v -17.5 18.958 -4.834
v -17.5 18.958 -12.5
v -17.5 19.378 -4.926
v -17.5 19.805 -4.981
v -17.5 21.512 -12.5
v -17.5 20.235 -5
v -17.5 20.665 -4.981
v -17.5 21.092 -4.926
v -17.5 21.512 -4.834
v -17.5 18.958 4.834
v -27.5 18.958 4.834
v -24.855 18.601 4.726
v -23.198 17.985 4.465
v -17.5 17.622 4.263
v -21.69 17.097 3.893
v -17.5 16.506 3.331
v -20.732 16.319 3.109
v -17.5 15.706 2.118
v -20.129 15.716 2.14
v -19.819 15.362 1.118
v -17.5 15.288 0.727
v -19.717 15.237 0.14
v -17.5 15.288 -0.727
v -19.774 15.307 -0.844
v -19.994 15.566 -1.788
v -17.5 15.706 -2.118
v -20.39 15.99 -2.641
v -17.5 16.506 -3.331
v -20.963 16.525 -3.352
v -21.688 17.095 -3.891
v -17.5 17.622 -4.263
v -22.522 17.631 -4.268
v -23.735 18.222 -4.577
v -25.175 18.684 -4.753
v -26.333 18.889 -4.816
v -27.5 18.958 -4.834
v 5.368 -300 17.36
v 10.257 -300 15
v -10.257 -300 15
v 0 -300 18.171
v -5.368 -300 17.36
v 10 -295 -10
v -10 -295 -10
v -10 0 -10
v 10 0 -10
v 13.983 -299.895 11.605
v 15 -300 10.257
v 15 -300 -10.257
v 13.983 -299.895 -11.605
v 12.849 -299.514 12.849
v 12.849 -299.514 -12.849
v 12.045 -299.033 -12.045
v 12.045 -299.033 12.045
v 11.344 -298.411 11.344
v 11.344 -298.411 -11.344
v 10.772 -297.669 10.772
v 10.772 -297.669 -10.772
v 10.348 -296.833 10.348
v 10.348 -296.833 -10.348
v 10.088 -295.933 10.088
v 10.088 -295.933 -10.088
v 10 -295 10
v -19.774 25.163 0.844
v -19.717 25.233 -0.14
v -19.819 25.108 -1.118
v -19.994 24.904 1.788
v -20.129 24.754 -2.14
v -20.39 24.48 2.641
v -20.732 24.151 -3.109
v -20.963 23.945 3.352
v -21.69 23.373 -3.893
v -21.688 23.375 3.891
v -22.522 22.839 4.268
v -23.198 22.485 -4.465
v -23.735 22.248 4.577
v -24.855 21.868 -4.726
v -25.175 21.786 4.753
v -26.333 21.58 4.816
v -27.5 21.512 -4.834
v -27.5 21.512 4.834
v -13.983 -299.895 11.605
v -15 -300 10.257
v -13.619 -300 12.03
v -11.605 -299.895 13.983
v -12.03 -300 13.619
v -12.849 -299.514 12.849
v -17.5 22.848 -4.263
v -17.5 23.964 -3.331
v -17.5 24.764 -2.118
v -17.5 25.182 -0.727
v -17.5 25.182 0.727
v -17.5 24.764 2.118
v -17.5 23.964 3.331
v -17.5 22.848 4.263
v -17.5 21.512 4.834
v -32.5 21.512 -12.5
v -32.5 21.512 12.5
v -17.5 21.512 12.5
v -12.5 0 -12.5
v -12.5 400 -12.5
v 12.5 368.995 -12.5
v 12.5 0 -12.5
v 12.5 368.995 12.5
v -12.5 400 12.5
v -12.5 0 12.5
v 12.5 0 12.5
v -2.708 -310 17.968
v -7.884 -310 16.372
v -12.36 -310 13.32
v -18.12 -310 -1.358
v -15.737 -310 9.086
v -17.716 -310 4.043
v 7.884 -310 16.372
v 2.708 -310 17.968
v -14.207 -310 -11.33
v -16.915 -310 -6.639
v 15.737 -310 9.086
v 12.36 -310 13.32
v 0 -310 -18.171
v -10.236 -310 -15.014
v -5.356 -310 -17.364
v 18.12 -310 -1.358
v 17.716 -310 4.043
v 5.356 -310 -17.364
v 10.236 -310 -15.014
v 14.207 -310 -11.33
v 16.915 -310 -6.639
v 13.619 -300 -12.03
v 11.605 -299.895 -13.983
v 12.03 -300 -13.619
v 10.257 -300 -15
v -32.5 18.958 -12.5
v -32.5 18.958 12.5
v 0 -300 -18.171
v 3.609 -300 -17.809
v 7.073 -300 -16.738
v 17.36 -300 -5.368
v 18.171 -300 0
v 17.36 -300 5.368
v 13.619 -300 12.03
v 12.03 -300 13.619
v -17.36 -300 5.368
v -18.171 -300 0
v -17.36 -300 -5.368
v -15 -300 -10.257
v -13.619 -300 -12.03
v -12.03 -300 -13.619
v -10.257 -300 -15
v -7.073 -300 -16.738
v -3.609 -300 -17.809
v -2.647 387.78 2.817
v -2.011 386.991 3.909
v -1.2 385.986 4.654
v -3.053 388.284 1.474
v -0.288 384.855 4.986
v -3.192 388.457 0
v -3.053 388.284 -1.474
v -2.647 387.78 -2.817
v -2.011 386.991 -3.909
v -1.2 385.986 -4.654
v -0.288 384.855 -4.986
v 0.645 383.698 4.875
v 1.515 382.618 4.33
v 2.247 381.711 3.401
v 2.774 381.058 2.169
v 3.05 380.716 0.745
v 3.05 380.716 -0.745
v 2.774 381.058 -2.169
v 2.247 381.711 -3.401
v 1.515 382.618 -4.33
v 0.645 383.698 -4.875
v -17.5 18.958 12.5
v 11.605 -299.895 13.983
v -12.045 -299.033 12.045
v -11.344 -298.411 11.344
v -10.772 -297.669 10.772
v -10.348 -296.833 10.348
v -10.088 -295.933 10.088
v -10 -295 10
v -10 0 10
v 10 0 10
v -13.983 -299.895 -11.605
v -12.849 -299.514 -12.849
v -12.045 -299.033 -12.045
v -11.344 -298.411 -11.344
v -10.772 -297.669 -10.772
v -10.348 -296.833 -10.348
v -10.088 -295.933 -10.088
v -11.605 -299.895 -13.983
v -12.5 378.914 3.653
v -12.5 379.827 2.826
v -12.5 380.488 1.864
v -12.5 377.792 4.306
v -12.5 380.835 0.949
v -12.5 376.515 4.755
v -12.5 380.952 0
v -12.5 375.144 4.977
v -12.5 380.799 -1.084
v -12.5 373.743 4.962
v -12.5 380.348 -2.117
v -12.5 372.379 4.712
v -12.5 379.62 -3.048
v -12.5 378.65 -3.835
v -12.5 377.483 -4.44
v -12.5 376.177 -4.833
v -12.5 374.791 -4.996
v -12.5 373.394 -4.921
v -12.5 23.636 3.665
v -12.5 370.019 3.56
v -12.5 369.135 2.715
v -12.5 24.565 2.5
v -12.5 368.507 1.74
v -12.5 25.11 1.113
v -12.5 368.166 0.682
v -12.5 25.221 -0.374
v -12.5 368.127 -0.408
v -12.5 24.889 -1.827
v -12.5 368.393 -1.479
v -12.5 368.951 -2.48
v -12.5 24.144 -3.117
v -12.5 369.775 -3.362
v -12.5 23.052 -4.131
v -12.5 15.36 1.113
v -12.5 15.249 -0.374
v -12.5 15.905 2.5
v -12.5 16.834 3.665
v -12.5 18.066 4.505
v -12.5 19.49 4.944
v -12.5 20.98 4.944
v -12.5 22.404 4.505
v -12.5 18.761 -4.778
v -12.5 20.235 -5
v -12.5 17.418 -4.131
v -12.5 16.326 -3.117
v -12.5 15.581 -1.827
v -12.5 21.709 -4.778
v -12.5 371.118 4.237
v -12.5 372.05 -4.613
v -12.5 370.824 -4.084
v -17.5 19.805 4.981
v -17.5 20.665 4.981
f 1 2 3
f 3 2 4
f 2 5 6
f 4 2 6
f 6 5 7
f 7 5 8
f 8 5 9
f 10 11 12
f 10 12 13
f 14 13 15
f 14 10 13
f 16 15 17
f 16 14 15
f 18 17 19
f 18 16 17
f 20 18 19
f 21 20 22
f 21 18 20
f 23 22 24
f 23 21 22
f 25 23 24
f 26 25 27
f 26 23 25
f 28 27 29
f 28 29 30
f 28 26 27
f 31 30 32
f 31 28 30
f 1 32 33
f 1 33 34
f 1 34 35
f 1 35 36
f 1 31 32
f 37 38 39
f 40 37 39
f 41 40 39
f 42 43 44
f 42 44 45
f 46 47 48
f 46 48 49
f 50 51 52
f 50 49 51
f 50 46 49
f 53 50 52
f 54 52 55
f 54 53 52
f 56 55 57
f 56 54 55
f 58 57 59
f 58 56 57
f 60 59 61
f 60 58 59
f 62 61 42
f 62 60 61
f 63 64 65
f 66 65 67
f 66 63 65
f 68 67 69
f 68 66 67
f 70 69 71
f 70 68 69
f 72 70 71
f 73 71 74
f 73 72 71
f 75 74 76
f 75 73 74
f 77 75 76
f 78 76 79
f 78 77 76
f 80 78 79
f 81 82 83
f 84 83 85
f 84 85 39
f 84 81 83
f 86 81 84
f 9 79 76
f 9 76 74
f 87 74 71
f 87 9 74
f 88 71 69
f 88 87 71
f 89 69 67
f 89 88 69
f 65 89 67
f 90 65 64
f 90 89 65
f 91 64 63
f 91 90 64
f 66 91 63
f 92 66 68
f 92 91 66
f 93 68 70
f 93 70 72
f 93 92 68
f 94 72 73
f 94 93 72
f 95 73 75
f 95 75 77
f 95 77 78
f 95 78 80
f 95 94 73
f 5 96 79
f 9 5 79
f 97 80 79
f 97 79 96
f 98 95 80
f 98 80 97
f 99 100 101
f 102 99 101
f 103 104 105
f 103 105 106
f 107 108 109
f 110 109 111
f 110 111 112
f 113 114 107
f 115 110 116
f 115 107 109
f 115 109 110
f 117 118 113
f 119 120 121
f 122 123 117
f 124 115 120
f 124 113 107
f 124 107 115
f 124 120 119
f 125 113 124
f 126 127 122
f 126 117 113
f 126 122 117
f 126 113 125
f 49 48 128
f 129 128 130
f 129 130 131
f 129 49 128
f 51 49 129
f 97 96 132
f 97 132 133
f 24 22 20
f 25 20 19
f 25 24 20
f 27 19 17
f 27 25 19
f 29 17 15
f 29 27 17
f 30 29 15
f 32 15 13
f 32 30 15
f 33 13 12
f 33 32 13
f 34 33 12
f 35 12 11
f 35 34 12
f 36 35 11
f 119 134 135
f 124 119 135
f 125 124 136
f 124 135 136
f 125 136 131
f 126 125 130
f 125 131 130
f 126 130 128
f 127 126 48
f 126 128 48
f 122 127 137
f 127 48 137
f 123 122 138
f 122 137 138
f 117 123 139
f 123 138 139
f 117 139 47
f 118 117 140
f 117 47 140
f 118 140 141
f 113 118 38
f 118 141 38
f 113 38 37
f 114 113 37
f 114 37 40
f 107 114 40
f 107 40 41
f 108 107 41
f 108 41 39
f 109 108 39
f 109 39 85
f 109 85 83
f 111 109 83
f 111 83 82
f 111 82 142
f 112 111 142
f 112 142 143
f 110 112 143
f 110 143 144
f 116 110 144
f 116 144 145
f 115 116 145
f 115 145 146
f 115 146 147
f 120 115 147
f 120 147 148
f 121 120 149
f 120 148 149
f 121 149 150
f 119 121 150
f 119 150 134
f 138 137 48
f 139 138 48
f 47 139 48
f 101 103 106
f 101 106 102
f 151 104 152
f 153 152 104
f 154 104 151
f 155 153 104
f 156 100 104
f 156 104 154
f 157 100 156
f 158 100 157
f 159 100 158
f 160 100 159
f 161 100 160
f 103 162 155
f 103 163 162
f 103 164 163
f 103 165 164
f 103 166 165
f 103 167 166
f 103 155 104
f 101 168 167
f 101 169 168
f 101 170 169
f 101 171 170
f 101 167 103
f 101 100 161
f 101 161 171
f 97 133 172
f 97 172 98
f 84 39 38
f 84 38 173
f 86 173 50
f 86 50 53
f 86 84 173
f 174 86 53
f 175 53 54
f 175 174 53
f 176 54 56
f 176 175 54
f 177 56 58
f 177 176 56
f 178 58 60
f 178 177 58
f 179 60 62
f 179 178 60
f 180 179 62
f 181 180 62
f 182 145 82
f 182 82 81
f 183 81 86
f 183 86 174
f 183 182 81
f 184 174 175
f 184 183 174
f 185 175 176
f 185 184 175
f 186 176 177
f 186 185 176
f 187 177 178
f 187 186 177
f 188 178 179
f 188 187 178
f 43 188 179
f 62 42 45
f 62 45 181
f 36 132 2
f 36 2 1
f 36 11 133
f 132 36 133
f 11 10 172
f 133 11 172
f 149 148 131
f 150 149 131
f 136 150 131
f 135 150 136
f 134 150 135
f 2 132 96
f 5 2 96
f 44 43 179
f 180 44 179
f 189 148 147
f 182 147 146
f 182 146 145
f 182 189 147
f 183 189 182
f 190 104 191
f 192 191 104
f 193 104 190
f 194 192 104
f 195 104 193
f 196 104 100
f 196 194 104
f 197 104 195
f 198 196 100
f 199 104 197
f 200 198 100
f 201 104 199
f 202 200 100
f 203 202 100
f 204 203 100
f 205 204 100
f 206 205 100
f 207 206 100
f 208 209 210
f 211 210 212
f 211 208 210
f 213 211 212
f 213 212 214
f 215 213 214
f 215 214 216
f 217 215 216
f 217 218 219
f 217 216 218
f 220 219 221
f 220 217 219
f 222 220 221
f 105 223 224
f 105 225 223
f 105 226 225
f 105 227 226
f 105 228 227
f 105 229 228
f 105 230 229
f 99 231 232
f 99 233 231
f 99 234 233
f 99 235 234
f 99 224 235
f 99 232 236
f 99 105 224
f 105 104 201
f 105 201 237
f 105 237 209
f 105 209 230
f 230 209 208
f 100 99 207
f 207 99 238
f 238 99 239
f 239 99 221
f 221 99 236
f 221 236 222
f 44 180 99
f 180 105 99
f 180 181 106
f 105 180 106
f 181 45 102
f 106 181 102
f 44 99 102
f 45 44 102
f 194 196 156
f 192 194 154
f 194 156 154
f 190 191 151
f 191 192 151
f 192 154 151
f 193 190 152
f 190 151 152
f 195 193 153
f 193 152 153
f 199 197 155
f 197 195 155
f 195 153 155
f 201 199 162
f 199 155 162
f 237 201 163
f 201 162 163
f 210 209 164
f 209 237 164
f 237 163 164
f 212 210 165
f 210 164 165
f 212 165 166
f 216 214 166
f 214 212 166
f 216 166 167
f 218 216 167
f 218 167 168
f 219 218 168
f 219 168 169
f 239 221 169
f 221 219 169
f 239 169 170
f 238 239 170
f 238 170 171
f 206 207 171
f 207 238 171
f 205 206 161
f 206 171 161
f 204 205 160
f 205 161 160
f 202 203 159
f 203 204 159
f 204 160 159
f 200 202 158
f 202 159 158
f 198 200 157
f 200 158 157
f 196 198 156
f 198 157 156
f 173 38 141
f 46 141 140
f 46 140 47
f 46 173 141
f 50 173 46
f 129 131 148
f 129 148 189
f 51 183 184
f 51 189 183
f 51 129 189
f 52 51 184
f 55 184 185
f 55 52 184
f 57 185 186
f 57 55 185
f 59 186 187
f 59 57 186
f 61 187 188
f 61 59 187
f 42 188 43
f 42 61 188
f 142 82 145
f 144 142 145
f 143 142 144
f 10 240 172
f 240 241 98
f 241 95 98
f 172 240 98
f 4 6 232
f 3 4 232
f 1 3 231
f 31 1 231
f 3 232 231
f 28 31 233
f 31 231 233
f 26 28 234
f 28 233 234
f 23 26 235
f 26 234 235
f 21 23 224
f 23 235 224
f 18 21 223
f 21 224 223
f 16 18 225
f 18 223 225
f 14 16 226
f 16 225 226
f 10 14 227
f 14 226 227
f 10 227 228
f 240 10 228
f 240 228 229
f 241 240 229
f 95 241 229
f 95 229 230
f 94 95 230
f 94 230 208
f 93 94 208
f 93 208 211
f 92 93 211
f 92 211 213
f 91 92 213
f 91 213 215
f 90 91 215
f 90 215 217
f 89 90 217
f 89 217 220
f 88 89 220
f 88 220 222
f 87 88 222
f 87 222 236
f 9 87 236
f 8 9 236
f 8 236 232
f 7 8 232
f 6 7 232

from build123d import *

# Parameters (mm, degrees)
IZIM1_W                     = 25
IZIM1_H                     = 25
Y_KSEKLIK_EKSTR_ZYON1_DEPTH = 400
IZIM2_W                     = 20
IZIM2_H                     = 20
Y_KSEKLIK_EKSTR_ZYON2_DEPTH = 300
IZIM3_R                     = 5
Y_KSEKLIK_EKSTR_ZYON3_DEPTH = 5
IZIM4_W                     = 25
IZIM4_H                     = 2.554442859
Y_KSEKLIK_EKSTR_ZYON4_DEPTH = 15
RADYUS1_R                   = 10
IZIM6_R                     = 18.171292503
Y_KSEKLIK_EKSTR_ZYON5_DEPTH = 10
RADYUS2_R                   = 5
KES_EKSTR_ZYON2_DEPTH       = 58
IZIM8_R                     = 5
KES_EKSTR_ZYON3_DEPTH       = 32


with BuildPart() as part:
    # Çizim1 → Yükseklik-Ekstrüzyon1 (new body)
    with BuildSketch(Plane(origin=(0, 0, 0), x_dir=(1, 0, 0), z_dir=(0, 1, 0))):
        Rectangle(IZIM1_W, IZIM1_H)
    extrude(amount=Y_KSEKLIK_EKSTR_ZYON1_DEPTH)

    # Çizim2 → Yükseklik-Ekstrüzyon2 (add)
    with BuildSketch(Plane.XZ):
        Rectangle(IZIM2_W, IZIM2_H)
    extrude(amount=Y_KSEKLIK_EKSTR_ZYON2_DEPTH)

    # Çizim3 → Yükseklik-Ekstrüzyon3 (add)
    with BuildSketch(Plane.ZY.offset(12.5)):
        with Locations(Location((0, 20.234922869, 0), (0, 0, 180))):
            Circle(IZIM3_R)
    extrude(amount=Y_KSEKLIK_EKSTR_ZYON3_DEPTH)

    # Çizim4 → Yükseklik-Ekstrüzyon4 (add)
    with BuildSketch(Plane.ZY.offset(17.5)):
        with Locations((0, 20.23492287)):
            Rectangle(IZIM4_W, IZIM4_H)
    extrude(amount=Y_KSEKLIK_EKSTR_ZYON4_DEPTH)

    # Radyus1
    # the kernel refuses this fillet: 10 mm, written as the material it adds along each edge
    with BuildSketch(Plane(origin=(-17.5, 18.95770144, -29.834118888), x_dir=(0, -1, 0), z_dir=(0, 0, 1))) as radyus1_piece_1_section:
        with BuildLine():
            CenterArc((RADYUS1_R, -RADYUS1_R), RADYUS1_R, 90, 90)
            Line((0, -RADYUS1_R), (0, 0))
            Line((0, 0), (RADYUS1_R, 0))
        make_face()
    radyus1_piece_1 = extrude(amount=59.668237775, mode=Mode.PRIVATE)
    radyus1_piece_1 = radyus1_piece_1 & Plane(origin=(-20.338214919, 20.234922869, 0), x_dir=(0, 0, -1), z_dir=(1, 0, 0)) * Cylinder(5, 160, mode=Mode.PRIVATE)
    add(radyus1_piece_1)
    with BuildSketch(Plane(origin=(-17.5, 21.512144299, 29.834118888), x_dir=(0, 1, 0), z_dir=(0, 0, -1))) as radyus1_piece_2_section:
        with BuildLine():
            CenterArc((RADYUS1_R, -RADYUS1_R), RADYUS1_R, 90, 90)
            Line((0, -RADYUS1_R), (0, 0))
            Line((0, 0), (RADYUS1_R, 0))
        make_face()
    radyus1_piece_2 = extrude(amount=59.668237775, mode=Mode.PRIVATE)
    radyus1_piece_2 = radyus1_piece_2 & Plane(origin=(-20.33821492, 20.234922869, 0), x_dir=(0, 0, -1), z_dir=(1, 0, 0)) * Cylinder(5, 160, mode=Mode.PRIVATE)
    add(radyus1_piece_2)

    # Çizim6 → Yükseklik-Ekstrüzyon5 (add)
    with BuildSketch(Plane.XZ.offset(300)):
        with Locations(Location((0, 0, 0), (0, 0, 270))):
            Circle(IZIM6_R)
    extrude(amount=Y_KSEKLIK_EKSTR_ZYON5_DEPTH)

    # Radyus2
    # the kernel refuses this fillet: 5 mm, written as the material it adds along each edge
    with BuildSketch(Plane(origin=(10, -300, 10), x_dir=(1, 0, 0), z_dir=(0, 0, -1)), Plane(origin=(-10, -300, 10), x_dir=(0, 0, 1), z_dir=(1, 0, 0)), Plane(origin=(-10, -300, -10), x_dir=(-1, 0, 0), z_dir=(0, 0, 1)), Plane(origin=(10, -300, -10), x_dir=(0, 0, -1), z_dir=(-1, 0, 0))) as radyus2_piece_1:
        with BuildLine():
            CenterArc((RADYUS2_R, -RADYUS2_R), RADYUS2_R, 90, 90)
            Line((0, -RADYUS2_R), (0, 0))
            Line((0, 0), (RADYUS2_R, 0))
        make_face()
    extrude(amount=20)
    with BuildSketch(Plane(origin=(10, -300, 22.5), x_dir=(1, 0, 0), z_dir=(0, 0, -1))) as radyus2_piece_2a_section:
        with BuildLine():
            CenterArc((RADYUS2_R, -RADYUS2_R), RADYUS2_R, 90, 90)
            Line((0, -RADYUS2_R), (0, 0))
            Line((0, 0), (RADYUS2_R, 0))
        make_face()
    radyus2_piece_2a = extrude(amount=32.5, mode=Mode.PRIVATE)
    radyus2_piece_2a = radyus2_piece_2a & Plane(origin=(0, -298.735965494, 0), x_dir=(0, 0, -1), z_dir=(0, 1, 0)) * Cylinder(18.171292503, 85, mode=Mode.PRIVATE)
    radyus2_piece_2a = split(radyus2_piece_2a, bisect_by=Plane(origin=(10.899012229, -298.735965494, 10), z_dir=(0, 0, 1)), keep=Keep.TOP, mode=Mode.PRIVATE)
    with BuildSketch(Plane(origin=(-10, -300, 10), x_dir=(0, 0, 1), z_dir=(1, 0, 0))) as radyus2_piece_2b_section:
        with BuildLine():
            CenterArc((RADYUS2_R, -RADYUS2_R), RADYUS2_R, 90, 90)
            Line((0, -RADYUS2_R), (0, 0))
            Line((0, 0), (RADYUS2_R, 0))
        make_face()
    radyus2_piece_2b = extrude(amount=32.5, mode=Mode.PRIVATE)
    radyus2_piece_2b = radyus2_piece_2b & Plane(origin=(0, -298.73596552, 0), x_dir=(0, 0, -1), z_dir=(0, 1, 0)) * Cylinder(18.171292503, 85, mode=Mode.PRIVATE)
    radyus2_piece_2b = split(radyus2_piece_2b, bisect_by=Plane(origin=(10, -298.73596552, 10.899011766), z_dir=(1, 0, 0)), keep=Keep.TOP, mode=Mode.PRIVATE)
    radyus2_piece_2 = radyus2_piece_2a & radyus2_piece_2b
    add(radyus2_piece_2)
    with BuildSketch(Plane(origin=(22.5, -300, -10), x_dir=(0, 0, -1), z_dir=(-1, 0, 0))) as radyus2_piece_3a_section:
        with BuildLine():
            CenterArc((RADYUS2_R, -RADYUS2_R), RADYUS2_R, 90, 90)
            Line((0, -RADYUS2_R), (0, 0))
            Line((0, 0), (RADYUS2_R, 0))
        make_face()
    radyus2_piece_3a = extrude(amount=32.5, mode=Mode.PRIVATE)
    radyus2_piece_3a = radyus2_piece_3a & Plane(origin=(0, -298.735965494, 0), x_dir=(0, 0, -1), z_dir=(0, 1, 0)) * Cylinder(18.171292503, 85, mode=Mode.PRIVATE)
    radyus2_piece_3a = split(radyus2_piece_3a, bisect_by=Plane(origin=(10, -298.735965494, -10.899012229), z_dir=(1, 0, 0)), keep=Keep.TOP, mode=Mode.PRIVATE)
    with BuildSketch(Plane(origin=(10, -300, 10), x_dir=(1, 0, 0), z_dir=(0, 0, -1))) as radyus2_piece_3b_section:
        with BuildLine():
            CenterArc((RADYUS2_R, -RADYUS2_R), RADYUS2_R, 90, 90)
            Line((0, -RADYUS2_R), (0, 0))
            Line((0, 0), (RADYUS2_R, 0))
        make_face()
    radyus2_piece_3b = extrude(amount=32.5, mode=Mode.PRIVATE)
    radyus2_piece_3b = radyus2_piece_3b & Plane(origin=(0, -298.73596552, 0), x_dir=(0, 0, -1), z_dir=(0, 1, 0)) * Cylinder(18.171292503, 85, mode=Mode.PRIVATE)
    radyus2_piece_3b = split(radyus2_piece_3b, bisect_by=Plane(origin=(10.899011766, -298.73596552, -10), z_dir=(0, 0, -1)), keep=Keep.TOP, mode=Mode.PRIVATE)
    radyus2_piece_3 = radyus2_piece_3a & radyus2_piece_3b
    add(radyus2_piece_3)
    with BuildSketch(Plane(origin=(-22.5, -300, 10), x_dir=(0, 0, 1), z_dir=(1, 0, 0))) as radyus2_piece_4a_section:
        with BuildLine():
            CenterArc((RADYUS2_R, -RADYUS2_R), RADYUS2_R, 90, 90)
            Line((0, -RADYUS2_R), (0, 0))
            Line((0, 0), (RADYUS2_R, 0))
        make_face()
    radyus2_piece_4a = extrude(amount=32.5, mode=Mode.PRIVATE)
    radyus2_piece_4a = radyus2_piece_4a & Plane(origin=(0, -298.735965494, 0), x_dir=(0, 0, -1), z_dir=(0, 1, 0)) * Cylinder(18.171292503, 85, mode=Mode.PRIVATE)
    radyus2_piece_4a = split(radyus2_piece_4a, bisect_by=Plane(origin=(-10, -298.735965494, 10.899012229), z_dir=(-1, 0, 0)), keep=Keep.TOP, mode=Mode.PRIVATE)
    with BuildSketch(Plane(origin=(-10, -300, -10), x_dir=(-1, 0, 0), z_dir=(0, 0, 1))) as radyus2_piece_4b_section:
        with BuildLine():
            CenterArc((RADYUS2_R, -RADYUS2_R), RADYUS2_R, 90, 90)
            Line((0, -RADYUS2_R), (0, 0))
            Line((0, 0), (RADYUS2_R, 0))
        make_face()
    radyus2_piece_4b = extrude(amount=32.5, mode=Mode.PRIVATE)
    radyus2_piece_4b = radyus2_piece_4b & Plane(origin=(0, -298.73596552, 0), x_dir=(0, 0, -1), z_dir=(0, 1, 0)) * Cylinder(18.171292503, 85, mode=Mode.PRIVATE)
    radyus2_piece_4b = split(radyus2_piece_4b, bisect_by=Plane(origin=(-10.899011766, -298.73596552, 10), z_dir=(0, 0, 1)), keep=Keep.TOP, mode=Mode.PRIVATE)
    radyus2_piece_4 = radyus2_piece_4a & radyus2_piece_4b
    add(radyus2_piece_4)
    with BuildSketch(Plane(origin=(10, -300, -10), x_dir=(0, 0, -1), z_dir=(-1, 0, 0))) as radyus2_piece_5a_section:
        with BuildLine():
            CenterArc((RADYUS2_R, -RADYUS2_R), RADYUS2_R, 90, 90)
            Line((0, -RADYUS2_R), (0, 0))
            Line((0, 0), (RADYUS2_R, 0))
        make_face()
    radyus2_piece_5a = extrude(amount=32.5, mode=Mode.PRIVATE)
    radyus2_piece_5a = radyus2_piece_5a & Plane(origin=(0, -298.73596552, 0), x_dir=(0, 0, -1), z_dir=(0, 1, 0)) * Cylinder(18.171292503, 86, mode=Mode.PRIVATE)
    radyus2_piece_5a = split(radyus2_piece_5a, bisect_by=Plane(origin=(-10, -298.73596552, -10.899011766), z_dir=(-1, 0, 0)), keep=Keep.TOP, mode=Mode.PRIVATE)
    with BuildSketch(Plane(origin=(-10, -300, -22.5), x_dir=(-1, 0, 0), z_dir=(0, 0, 1))) as radyus2_piece_5b_section:
        with BuildLine():
            CenterArc((RADYUS2_R, -RADYUS2_R), RADYUS2_R, 90, 90)
            Line((0, -RADYUS2_R), (0, 0))
            Line((0, 0), (RADYUS2_R, 0))
        make_face()
    radyus2_piece_5b = extrude(amount=32.5, mode=Mode.PRIVATE)
    radyus2_piece_5b = radyus2_piece_5b & Plane(origin=(0, -298.735965494, 0), x_dir=(0, 0, -1), z_dir=(0, 1, 0)) * Cylinder(18.171292503, 85, mode=Mode.PRIVATE)
    radyus2_piece_5b = split(radyus2_piece_5b, bisect_by=Plane(origin=(-10.899012229, -298.735965494, -10), z_dir=(0, 0, -1)), keep=Keep.TOP, mode=Mode.PRIVATE)
    radyus2_piece_5 = radyus2_piece_5a & radyus2_piece_5b
    add(radyus2_piece_5)

    # Çizim7 → Kes-Ekstrüzyon2 (cut)
    with BuildSketch(Plane(origin=(0, 0, -12.5), x_dir=(-1, 0, 0), z_dir=(0, 0, -1))):
        Polygon((12.5, 400), (-29.263602087, 348.205056807), (-29.263602087, 417.124411345), (12.5, 417.124411345), align=None)
    extrude(amount=-KES_EKSTR_ZYON2_DEPTH, mode=Mode.SUBTRACT)

    # Çizim8 → Kes-Ekstrüzyon3 (cut)
    with BuildSketch(Plane(origin=(187.878801042, 151.491535729, 0), x_dir=(0, 0, -1), z_dir=(0.7784608732437974, 0.6276931326918469, 0))):
        with Locations(Location((0, 299.402134432, 0), (0, 0, 90))):
            Circle(IZIM8_R)
    extrude(amount=-KES_EKSTR_ZYON3_DEPTH, mode=Mode.SUBTRACT)


solid = part.part
